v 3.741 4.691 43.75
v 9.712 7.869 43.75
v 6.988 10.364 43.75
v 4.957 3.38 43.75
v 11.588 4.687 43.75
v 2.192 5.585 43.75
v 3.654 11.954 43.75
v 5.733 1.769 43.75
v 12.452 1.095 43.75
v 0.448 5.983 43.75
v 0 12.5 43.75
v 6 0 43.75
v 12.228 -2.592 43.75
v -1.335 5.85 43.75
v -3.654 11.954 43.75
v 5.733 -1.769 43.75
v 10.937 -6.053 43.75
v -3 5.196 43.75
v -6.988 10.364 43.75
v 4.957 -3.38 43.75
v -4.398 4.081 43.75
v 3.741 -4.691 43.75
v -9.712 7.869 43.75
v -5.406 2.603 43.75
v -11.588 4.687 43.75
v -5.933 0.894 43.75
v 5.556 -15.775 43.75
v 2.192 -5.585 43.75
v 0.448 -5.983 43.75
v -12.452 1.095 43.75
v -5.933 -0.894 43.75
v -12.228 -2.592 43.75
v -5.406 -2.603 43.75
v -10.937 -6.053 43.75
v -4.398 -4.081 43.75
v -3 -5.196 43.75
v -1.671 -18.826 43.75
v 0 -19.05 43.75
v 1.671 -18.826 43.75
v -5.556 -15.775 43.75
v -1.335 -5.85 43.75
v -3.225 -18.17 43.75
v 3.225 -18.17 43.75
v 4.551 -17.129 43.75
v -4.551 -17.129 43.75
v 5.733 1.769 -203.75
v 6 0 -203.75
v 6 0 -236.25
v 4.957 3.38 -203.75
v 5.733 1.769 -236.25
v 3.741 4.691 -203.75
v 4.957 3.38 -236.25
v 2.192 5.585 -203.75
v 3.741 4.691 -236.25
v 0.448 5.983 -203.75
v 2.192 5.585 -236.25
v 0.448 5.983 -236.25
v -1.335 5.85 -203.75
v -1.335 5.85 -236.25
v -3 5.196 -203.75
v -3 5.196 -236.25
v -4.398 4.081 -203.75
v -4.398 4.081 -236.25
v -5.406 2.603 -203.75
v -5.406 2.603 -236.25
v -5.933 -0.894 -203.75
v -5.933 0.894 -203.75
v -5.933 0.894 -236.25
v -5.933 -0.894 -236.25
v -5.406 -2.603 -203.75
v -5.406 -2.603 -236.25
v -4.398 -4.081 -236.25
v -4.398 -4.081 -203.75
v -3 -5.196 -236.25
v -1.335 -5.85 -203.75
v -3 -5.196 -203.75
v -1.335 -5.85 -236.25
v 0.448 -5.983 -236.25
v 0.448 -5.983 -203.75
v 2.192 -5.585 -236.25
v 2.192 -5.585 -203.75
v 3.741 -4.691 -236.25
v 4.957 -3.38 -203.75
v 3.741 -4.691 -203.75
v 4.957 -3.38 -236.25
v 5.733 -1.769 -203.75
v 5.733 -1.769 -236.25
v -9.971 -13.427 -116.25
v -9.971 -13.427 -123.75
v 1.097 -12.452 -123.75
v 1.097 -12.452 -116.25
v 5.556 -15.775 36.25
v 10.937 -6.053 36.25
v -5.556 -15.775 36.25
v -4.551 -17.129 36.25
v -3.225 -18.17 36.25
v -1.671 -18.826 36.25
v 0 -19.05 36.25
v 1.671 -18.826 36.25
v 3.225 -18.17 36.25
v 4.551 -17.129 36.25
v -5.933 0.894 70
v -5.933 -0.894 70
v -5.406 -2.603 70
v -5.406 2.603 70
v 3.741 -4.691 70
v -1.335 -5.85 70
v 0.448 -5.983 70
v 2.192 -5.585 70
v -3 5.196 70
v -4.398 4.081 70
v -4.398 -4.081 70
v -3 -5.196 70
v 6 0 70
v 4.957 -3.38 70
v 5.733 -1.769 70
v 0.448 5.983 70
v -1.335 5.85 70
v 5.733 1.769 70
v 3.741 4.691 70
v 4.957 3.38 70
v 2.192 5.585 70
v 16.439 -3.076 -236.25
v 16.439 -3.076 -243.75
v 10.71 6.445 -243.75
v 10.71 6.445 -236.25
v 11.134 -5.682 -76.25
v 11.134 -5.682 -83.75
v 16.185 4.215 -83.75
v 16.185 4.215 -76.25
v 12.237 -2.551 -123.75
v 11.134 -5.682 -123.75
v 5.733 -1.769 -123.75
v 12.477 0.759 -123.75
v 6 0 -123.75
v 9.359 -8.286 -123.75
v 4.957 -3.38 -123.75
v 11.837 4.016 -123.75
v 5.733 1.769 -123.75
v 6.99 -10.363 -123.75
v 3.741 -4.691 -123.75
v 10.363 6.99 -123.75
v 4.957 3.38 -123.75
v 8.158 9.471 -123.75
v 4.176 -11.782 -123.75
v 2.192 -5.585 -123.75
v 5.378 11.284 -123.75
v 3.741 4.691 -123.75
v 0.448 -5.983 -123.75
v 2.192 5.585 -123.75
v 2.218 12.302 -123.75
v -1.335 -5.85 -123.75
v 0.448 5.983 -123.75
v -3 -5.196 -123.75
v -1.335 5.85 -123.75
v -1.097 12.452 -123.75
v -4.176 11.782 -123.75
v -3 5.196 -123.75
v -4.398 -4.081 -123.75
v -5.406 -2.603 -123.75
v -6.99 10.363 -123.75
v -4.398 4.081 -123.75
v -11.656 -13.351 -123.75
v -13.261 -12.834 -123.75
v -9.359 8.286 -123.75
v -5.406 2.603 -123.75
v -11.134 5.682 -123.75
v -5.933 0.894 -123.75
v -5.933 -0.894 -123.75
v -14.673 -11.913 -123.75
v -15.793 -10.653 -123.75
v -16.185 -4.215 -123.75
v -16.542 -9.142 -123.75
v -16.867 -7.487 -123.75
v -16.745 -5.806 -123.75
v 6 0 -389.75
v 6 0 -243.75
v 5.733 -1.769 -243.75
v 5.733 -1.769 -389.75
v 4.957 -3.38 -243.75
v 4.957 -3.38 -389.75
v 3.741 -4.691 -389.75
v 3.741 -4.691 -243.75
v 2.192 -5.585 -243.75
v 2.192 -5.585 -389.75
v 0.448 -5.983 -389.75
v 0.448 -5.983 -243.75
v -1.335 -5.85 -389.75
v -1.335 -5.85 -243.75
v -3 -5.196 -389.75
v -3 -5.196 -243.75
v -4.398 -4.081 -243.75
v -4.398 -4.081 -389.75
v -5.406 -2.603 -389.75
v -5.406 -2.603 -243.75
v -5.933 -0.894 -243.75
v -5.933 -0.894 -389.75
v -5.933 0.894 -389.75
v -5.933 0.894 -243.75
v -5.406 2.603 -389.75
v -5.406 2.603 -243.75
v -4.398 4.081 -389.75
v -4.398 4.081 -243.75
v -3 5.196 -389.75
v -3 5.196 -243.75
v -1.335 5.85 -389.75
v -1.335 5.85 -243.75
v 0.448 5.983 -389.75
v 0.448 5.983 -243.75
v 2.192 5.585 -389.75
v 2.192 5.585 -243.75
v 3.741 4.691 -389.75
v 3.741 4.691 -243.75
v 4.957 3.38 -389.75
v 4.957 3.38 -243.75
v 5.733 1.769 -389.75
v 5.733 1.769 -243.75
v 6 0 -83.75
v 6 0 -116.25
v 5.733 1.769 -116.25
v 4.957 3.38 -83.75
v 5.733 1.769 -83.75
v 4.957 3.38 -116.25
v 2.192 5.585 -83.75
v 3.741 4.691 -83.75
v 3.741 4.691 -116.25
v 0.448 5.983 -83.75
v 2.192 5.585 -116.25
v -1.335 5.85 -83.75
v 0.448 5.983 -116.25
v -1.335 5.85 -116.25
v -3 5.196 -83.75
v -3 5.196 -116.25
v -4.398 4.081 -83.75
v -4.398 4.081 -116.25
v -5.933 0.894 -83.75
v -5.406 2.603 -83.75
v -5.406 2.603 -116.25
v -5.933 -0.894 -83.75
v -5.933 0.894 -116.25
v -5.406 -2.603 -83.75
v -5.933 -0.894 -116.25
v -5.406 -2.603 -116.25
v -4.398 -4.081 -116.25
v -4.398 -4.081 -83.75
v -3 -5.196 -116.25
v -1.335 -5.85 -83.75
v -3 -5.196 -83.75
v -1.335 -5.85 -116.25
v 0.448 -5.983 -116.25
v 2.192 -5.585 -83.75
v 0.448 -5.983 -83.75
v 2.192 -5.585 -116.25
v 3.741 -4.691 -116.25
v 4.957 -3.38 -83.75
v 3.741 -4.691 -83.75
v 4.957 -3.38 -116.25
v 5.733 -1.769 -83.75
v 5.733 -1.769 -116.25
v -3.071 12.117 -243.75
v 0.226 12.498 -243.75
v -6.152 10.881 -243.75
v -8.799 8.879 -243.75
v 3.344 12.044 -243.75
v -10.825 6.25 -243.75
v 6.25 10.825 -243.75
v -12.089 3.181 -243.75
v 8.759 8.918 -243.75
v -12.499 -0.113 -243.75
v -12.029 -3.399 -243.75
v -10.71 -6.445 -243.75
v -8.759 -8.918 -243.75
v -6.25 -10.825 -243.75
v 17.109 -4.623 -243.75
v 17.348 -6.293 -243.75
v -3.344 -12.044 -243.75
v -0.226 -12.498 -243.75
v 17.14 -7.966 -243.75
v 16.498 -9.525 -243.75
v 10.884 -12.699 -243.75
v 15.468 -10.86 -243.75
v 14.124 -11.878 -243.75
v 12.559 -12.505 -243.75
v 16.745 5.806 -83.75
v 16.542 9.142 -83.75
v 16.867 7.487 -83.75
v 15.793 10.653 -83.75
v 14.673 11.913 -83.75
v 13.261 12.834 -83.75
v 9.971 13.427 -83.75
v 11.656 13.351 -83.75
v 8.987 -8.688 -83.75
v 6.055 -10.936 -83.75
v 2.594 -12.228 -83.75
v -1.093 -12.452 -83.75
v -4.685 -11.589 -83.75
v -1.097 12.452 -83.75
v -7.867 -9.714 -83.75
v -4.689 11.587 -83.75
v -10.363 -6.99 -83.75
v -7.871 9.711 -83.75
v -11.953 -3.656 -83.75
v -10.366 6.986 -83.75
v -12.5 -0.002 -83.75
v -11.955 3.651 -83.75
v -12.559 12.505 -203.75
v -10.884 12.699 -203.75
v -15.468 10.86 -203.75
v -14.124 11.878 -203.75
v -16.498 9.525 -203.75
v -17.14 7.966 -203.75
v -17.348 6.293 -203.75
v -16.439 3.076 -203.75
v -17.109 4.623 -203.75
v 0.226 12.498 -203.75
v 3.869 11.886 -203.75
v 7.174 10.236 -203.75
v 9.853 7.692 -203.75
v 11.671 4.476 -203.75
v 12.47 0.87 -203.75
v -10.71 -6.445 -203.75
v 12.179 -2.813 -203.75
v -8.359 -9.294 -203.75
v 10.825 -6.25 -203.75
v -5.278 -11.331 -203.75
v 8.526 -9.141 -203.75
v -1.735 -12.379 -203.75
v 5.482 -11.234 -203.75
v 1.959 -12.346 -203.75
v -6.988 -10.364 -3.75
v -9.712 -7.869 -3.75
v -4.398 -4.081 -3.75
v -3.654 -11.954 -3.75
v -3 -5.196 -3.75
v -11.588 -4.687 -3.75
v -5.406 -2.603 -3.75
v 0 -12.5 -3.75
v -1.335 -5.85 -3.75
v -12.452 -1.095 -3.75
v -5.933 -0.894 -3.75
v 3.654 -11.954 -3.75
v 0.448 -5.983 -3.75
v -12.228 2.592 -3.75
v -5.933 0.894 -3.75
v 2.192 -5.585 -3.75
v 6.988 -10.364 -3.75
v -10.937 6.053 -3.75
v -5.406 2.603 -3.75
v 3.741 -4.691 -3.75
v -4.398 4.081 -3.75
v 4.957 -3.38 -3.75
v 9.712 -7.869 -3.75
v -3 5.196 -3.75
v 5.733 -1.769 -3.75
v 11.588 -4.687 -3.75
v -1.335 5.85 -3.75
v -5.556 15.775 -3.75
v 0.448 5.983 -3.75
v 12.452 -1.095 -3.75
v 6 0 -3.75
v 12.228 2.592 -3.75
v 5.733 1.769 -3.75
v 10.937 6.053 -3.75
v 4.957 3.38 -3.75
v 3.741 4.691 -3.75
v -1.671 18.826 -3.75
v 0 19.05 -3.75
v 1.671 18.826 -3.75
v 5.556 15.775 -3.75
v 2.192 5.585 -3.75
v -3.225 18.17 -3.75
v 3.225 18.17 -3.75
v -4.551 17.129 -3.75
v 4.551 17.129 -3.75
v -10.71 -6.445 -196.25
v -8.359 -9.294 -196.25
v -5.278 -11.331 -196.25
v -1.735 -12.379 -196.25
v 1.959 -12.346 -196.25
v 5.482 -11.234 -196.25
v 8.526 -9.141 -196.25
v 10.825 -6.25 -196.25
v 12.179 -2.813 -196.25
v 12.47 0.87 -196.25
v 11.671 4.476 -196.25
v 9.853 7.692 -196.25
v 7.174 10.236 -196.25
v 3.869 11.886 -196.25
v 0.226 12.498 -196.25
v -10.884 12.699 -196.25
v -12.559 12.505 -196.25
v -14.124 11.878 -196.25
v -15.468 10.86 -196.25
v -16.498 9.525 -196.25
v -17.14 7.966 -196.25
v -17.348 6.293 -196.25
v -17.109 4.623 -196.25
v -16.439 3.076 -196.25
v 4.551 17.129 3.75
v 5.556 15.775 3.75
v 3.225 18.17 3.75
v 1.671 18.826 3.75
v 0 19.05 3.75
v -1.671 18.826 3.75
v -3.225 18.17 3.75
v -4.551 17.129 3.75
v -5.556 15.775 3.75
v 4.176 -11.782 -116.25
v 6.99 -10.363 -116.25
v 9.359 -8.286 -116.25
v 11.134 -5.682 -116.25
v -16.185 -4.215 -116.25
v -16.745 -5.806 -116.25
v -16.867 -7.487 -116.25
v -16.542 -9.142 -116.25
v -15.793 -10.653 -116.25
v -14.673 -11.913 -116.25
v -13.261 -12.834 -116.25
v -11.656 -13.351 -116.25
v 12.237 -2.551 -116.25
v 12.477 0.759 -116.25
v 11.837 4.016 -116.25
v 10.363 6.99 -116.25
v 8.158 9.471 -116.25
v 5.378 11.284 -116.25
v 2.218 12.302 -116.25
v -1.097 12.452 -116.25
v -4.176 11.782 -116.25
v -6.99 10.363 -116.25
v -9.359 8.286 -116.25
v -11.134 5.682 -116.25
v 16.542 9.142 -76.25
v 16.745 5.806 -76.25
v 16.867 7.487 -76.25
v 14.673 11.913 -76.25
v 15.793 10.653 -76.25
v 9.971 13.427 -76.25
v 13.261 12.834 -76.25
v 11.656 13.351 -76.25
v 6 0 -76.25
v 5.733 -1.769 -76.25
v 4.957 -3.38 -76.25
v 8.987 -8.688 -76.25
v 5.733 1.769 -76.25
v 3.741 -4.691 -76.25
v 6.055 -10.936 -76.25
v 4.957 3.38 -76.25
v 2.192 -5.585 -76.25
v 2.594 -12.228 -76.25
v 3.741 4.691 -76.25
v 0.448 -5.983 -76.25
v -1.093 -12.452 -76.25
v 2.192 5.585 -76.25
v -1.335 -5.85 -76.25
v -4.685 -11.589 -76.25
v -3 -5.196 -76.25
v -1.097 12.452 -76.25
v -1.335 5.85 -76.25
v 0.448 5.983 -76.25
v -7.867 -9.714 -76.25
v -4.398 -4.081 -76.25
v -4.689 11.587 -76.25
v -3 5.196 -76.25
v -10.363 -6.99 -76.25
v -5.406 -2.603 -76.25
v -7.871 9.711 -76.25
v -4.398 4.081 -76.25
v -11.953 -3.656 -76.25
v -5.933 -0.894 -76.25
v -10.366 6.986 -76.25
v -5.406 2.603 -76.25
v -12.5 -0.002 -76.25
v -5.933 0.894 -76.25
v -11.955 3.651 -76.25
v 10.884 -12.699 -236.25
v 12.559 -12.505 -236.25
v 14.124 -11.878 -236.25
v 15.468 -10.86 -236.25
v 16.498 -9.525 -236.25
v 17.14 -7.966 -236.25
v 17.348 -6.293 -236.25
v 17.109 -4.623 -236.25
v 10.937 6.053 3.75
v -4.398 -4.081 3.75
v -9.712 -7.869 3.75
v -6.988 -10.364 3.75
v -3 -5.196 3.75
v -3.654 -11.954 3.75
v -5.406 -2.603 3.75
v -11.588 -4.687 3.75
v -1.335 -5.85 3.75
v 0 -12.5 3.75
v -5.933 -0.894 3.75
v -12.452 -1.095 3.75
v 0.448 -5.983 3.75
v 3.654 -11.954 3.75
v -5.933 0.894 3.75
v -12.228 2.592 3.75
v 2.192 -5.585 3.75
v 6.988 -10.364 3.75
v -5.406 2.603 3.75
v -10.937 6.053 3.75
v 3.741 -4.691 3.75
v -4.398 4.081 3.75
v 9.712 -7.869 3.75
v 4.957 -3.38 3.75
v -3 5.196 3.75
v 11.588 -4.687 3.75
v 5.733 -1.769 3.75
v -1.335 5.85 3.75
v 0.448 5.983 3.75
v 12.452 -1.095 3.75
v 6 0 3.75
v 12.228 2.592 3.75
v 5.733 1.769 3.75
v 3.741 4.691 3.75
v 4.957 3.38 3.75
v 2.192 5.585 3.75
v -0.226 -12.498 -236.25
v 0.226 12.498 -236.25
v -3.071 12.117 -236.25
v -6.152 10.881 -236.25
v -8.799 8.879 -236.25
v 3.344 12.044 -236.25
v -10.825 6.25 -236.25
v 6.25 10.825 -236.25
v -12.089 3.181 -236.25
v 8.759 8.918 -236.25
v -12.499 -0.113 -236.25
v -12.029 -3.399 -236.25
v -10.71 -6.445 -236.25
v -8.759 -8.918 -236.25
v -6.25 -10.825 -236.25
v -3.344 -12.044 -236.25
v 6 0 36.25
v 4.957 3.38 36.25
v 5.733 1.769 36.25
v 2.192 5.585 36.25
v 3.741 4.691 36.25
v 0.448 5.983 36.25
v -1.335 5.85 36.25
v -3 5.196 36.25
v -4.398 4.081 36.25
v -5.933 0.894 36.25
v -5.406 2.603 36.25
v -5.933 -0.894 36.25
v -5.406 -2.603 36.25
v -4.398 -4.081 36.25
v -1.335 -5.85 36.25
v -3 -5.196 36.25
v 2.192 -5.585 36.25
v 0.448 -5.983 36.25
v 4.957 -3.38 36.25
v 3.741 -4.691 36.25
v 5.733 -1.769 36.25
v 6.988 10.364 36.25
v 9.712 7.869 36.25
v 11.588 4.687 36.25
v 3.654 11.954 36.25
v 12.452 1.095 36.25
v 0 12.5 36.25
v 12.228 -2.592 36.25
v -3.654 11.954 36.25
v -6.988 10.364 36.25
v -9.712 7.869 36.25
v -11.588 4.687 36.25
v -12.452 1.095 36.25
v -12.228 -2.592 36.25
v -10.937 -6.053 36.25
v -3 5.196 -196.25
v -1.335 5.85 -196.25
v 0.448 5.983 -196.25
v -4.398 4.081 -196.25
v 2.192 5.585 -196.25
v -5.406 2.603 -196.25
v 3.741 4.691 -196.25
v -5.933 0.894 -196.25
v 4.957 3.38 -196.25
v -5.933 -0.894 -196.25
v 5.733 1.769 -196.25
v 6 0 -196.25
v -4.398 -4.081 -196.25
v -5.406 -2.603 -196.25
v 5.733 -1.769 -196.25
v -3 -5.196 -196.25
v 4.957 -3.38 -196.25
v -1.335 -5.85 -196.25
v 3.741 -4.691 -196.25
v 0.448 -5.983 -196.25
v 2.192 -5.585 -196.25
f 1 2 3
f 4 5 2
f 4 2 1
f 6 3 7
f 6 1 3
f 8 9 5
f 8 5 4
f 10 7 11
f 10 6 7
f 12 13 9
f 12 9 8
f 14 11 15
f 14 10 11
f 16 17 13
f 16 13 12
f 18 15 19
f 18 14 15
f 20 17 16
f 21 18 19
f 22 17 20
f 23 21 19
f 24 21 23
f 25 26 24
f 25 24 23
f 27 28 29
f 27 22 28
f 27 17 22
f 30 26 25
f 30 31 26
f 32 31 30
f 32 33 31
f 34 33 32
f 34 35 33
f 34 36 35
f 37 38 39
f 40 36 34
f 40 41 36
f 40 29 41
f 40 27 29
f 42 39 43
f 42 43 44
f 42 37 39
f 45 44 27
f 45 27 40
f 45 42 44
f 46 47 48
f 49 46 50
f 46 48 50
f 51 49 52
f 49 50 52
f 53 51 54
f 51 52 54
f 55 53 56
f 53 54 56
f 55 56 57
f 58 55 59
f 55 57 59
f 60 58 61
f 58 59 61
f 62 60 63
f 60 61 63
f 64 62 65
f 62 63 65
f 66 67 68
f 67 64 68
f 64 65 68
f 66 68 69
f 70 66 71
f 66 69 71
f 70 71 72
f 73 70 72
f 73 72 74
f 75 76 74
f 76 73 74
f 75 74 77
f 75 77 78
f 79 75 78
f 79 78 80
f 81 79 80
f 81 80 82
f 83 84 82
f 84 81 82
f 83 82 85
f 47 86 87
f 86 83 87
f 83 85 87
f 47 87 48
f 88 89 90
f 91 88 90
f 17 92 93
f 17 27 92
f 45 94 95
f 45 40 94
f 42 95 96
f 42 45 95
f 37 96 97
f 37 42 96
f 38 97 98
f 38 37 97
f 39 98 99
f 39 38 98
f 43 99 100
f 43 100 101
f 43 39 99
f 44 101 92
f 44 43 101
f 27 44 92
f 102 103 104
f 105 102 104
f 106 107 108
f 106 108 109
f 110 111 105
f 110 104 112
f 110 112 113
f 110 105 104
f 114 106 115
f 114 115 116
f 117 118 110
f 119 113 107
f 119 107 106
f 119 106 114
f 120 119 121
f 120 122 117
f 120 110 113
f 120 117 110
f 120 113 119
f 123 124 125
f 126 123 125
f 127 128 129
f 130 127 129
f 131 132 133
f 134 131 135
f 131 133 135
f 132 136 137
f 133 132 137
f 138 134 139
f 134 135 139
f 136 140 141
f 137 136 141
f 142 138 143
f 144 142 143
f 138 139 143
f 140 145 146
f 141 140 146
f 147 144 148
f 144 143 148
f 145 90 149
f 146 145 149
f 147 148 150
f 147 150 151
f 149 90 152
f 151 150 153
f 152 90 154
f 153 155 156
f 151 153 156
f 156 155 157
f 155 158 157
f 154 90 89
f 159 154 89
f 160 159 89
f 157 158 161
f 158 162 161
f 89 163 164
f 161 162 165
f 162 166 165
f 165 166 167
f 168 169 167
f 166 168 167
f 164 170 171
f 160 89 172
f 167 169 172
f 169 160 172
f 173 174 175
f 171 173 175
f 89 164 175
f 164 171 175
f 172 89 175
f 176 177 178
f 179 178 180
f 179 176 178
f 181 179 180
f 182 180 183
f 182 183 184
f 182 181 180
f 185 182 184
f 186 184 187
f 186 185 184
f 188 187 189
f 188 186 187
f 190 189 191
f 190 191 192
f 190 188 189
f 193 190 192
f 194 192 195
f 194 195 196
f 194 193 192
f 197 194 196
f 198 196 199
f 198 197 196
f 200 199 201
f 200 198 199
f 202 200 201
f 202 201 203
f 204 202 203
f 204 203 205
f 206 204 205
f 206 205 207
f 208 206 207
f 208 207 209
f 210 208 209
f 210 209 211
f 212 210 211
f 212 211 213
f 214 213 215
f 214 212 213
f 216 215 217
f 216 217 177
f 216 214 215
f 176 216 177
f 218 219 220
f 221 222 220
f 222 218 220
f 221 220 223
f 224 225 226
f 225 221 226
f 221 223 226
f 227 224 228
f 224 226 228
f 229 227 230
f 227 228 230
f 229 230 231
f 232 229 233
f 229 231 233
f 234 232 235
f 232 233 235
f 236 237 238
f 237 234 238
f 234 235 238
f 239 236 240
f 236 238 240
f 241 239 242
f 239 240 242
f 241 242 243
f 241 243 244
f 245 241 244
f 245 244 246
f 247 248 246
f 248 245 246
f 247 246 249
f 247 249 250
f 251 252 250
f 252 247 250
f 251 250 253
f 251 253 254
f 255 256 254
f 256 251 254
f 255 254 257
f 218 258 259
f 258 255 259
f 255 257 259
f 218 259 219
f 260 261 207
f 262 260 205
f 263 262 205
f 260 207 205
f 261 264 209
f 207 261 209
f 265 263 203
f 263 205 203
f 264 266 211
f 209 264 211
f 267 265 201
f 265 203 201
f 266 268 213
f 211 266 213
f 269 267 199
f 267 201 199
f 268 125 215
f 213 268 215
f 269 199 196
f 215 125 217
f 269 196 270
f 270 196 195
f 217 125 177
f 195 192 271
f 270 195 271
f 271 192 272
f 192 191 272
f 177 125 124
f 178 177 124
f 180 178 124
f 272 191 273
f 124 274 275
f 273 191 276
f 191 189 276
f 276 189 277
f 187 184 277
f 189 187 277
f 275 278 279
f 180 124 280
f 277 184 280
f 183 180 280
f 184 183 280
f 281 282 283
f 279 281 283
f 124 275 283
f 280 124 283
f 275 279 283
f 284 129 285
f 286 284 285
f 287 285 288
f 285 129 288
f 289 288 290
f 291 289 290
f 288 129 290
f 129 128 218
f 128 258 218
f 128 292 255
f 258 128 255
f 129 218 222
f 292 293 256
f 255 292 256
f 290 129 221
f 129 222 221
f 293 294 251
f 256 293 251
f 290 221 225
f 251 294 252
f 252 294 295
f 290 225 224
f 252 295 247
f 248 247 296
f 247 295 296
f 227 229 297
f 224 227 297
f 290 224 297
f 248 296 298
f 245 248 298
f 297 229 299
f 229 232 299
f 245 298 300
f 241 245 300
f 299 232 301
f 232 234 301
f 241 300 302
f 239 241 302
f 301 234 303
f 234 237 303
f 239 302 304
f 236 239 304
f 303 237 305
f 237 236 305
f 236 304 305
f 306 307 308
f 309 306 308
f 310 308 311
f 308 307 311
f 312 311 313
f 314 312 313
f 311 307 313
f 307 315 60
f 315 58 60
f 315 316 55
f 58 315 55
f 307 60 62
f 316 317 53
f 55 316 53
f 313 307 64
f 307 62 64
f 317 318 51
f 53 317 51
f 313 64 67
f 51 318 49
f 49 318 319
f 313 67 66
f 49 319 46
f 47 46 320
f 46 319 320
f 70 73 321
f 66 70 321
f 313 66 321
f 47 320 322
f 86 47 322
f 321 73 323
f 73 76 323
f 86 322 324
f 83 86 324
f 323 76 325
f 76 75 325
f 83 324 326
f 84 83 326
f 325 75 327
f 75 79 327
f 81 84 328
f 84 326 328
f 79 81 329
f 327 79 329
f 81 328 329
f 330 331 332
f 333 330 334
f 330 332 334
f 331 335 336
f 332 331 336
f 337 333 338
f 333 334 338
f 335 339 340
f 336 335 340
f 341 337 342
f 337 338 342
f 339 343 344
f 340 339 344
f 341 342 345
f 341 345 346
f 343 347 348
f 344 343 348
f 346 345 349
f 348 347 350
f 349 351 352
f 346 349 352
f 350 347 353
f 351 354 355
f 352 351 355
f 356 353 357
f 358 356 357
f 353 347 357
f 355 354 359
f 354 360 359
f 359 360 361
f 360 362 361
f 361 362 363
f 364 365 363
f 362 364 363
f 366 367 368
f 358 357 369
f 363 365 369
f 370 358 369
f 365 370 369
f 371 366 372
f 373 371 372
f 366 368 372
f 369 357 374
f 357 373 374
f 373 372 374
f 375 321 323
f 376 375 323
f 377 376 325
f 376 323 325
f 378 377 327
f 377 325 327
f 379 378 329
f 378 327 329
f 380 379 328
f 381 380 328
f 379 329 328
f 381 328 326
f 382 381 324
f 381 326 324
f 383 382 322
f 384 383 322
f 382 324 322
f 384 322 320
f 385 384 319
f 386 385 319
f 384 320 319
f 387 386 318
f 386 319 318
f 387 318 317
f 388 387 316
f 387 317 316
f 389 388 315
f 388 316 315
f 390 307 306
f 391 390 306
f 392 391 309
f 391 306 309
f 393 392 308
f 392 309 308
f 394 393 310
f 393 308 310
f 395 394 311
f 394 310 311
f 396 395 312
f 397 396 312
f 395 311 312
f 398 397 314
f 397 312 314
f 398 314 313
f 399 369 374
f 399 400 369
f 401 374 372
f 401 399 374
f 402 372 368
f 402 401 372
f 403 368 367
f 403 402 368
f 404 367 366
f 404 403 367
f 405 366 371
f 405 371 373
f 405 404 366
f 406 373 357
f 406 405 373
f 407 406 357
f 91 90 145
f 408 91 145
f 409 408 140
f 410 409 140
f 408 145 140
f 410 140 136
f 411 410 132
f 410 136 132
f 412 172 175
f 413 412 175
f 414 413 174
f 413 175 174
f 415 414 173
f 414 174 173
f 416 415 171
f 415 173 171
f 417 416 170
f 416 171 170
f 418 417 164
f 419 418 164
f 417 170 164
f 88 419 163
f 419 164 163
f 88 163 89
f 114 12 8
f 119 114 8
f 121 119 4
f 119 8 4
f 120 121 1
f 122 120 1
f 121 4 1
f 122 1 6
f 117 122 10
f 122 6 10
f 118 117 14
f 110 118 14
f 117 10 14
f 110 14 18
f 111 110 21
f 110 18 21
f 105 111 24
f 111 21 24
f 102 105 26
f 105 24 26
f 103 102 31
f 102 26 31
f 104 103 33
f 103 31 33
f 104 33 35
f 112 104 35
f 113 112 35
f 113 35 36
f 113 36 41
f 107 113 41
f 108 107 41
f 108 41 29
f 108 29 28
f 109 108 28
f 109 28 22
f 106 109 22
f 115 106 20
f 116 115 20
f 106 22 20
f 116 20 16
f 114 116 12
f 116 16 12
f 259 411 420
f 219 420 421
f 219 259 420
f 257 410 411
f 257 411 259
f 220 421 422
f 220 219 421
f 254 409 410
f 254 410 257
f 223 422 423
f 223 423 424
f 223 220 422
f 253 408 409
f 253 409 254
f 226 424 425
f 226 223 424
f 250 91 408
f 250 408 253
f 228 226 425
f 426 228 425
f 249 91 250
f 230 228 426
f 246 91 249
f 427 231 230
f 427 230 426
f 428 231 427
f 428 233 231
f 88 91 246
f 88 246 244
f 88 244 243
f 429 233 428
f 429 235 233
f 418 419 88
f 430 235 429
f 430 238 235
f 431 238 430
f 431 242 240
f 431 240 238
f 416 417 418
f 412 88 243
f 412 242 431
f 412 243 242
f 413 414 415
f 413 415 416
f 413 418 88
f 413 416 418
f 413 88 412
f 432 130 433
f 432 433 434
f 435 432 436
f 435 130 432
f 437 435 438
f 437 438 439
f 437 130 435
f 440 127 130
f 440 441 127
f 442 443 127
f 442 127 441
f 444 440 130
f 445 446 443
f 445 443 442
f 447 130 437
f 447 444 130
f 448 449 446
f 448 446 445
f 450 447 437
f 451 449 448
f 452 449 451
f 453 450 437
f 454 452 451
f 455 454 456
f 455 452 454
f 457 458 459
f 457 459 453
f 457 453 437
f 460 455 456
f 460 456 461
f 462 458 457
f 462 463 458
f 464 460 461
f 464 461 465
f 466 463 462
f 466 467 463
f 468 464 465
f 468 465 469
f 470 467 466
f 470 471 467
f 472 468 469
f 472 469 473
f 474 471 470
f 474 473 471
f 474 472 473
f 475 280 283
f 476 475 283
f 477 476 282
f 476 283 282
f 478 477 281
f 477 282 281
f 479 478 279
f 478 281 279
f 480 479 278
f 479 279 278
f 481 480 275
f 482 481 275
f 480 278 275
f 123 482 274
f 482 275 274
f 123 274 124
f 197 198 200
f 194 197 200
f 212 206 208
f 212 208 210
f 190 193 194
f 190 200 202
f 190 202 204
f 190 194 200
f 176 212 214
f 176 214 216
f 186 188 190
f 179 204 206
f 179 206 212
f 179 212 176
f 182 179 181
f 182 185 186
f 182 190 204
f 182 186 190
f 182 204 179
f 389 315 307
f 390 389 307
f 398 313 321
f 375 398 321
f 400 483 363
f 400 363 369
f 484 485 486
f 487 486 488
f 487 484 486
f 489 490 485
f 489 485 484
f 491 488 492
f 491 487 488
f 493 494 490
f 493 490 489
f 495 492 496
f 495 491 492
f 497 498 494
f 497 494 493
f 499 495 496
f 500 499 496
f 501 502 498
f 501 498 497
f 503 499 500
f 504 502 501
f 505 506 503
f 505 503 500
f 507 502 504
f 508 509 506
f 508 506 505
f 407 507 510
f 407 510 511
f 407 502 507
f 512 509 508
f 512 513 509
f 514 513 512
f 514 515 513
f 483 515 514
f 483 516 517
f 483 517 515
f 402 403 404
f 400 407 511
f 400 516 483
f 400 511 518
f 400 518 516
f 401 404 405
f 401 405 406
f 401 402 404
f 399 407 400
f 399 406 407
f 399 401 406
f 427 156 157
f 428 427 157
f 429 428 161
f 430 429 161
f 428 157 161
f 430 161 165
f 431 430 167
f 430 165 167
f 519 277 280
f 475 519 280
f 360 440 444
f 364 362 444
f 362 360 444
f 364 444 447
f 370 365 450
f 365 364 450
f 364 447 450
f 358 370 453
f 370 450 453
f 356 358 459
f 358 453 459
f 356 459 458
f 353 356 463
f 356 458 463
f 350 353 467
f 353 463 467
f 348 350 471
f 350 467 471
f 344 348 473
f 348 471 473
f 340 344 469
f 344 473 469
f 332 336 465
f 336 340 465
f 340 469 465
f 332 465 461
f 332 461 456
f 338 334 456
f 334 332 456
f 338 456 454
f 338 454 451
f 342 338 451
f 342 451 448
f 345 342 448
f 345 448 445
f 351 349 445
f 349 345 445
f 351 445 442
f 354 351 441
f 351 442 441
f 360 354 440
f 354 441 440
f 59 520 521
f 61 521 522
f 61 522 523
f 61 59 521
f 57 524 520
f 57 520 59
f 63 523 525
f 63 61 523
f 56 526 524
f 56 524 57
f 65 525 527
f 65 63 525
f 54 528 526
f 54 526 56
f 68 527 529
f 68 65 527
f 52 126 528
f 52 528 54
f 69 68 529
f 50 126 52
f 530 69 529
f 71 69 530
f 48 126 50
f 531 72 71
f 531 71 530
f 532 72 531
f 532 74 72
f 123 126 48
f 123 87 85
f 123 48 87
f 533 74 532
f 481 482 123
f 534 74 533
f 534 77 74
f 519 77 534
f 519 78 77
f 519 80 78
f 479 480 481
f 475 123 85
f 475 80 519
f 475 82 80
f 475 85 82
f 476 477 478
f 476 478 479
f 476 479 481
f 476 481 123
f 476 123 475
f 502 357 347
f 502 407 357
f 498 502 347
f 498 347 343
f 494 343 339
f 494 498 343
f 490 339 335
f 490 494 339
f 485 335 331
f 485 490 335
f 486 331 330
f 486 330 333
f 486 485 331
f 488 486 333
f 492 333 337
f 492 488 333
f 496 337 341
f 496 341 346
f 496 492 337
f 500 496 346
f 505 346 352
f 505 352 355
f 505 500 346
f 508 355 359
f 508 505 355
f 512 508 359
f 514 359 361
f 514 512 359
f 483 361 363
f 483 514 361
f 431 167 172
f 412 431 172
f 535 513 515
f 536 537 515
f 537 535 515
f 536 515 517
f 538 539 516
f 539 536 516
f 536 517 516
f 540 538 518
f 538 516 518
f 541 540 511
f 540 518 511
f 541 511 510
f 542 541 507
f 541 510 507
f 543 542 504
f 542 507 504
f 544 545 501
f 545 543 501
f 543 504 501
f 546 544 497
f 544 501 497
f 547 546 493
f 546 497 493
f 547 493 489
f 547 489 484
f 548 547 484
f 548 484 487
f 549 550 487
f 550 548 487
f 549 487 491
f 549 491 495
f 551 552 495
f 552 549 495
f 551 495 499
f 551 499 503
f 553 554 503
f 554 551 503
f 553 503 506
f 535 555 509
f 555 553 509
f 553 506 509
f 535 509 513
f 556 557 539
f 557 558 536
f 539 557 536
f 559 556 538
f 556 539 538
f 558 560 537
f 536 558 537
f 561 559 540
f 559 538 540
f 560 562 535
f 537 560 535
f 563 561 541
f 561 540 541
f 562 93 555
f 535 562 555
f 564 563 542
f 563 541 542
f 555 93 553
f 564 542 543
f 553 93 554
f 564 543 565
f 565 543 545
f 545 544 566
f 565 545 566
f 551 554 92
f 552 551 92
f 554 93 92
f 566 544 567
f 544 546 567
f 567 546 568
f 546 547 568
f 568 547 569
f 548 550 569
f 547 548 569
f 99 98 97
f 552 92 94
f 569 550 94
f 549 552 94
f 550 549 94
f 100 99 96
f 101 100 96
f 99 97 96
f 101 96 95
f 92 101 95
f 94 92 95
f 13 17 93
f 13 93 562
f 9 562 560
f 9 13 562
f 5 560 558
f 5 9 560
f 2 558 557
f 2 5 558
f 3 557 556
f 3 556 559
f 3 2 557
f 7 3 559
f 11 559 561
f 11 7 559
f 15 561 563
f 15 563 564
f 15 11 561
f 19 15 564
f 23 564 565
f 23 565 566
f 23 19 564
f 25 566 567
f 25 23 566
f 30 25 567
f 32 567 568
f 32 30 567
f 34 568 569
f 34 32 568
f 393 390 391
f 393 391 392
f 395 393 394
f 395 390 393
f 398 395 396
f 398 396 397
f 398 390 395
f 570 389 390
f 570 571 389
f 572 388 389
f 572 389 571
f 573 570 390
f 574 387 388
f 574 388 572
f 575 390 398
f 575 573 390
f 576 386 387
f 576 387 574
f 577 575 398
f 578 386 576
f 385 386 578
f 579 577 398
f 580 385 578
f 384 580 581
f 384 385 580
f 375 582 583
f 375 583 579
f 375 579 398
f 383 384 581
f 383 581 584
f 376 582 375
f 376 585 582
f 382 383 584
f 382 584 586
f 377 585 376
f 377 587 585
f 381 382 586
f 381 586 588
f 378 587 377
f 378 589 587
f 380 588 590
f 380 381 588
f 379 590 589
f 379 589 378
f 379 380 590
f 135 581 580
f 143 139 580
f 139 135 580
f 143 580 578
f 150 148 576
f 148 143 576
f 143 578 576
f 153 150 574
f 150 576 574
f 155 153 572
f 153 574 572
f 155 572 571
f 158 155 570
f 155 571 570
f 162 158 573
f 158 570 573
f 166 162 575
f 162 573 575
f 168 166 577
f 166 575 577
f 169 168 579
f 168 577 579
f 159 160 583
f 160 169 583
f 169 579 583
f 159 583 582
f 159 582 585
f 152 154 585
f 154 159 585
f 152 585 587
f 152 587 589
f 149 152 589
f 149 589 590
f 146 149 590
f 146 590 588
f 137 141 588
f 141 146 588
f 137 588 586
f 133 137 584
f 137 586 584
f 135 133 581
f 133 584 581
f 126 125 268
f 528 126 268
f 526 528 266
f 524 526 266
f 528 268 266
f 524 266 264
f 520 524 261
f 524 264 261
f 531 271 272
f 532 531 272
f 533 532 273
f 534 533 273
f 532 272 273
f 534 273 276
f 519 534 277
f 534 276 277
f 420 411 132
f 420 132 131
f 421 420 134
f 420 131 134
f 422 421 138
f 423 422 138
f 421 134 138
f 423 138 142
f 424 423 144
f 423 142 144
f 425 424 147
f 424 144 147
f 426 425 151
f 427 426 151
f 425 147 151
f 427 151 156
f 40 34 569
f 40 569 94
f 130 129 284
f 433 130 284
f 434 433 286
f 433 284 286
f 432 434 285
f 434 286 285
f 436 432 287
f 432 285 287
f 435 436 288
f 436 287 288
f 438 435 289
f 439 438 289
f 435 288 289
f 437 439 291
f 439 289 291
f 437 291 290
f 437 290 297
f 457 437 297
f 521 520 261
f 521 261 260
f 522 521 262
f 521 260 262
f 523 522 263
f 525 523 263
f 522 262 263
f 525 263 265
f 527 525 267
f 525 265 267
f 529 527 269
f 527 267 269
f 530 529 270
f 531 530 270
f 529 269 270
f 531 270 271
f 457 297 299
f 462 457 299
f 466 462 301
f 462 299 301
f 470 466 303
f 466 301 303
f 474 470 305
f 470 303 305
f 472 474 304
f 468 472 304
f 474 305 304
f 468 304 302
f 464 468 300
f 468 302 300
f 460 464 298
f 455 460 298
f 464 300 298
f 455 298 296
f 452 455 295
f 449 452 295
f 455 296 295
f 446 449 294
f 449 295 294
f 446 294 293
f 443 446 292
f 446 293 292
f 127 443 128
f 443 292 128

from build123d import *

# Parameters (mm, degrees)
SALIENTE_EXTRUIR1_DEPTH      = 3.75
S_LIDO_MOVER_COPIAR2_ANGLE   = 180
S_LIDO_MOVER_COPIAR4_START   = -243.75
S_LIDO_MOVER_COPIAR4_DEPTH   = 7.5
S_LIDO_MOVER_COPIAR4_START_2 = -203.75
S_LIDO_MOVER_COPIAR4_2_DEPTH = 7.5
S_LIDO_MOVER_COPIAR4_START_3 = -123.75
S_LIDO_MOVER_COPIAR4_3_DEPTH = 7.5
S_LIDO_MOVER_COPIAR4_START_4 = -83.75
S_LIDO_MOVER_COPIAR4_4_DEPTH = 7.5
S_LIDO_MOVER_COPIAR5_ANGLE   = 124
S_LIDO_MOVER_COPIAR6_ANGLE   = 120
CROQUIS5_R                   = 6
SALIENTE_EXTRUIR4_DEPTH      = 275
SALIENTE_EXTRUIR5_START      = 146
CROQUIS6_R                   = 6
SALIENTE_EXTRUIR5_DEPTH      = 146
CROQUIS7_R                   = 6
SALIENTE_EXTRUIR6_DEPTH      = 26.25


# Read off the part's stored shape, not the designer's step: Sólido-Mover/Copiar4
with BuildPart() as part:
    # Croquis1 → Saliente-Extruir1 (new, symmetric)
    with BuildSketch(Plane.XY):
        with BuildLine():
            Line((-5.555796523, 15.775), (-10.936607328, 6.053149606))
            ThreePointArc((-10.936607328, 6.053149606), (0, -12.5), (10.936607328, 6.053149606))
            Line((10.936607328, 6.053149606), (5.555796523, 15.775))
            ThreePointArc((5.555796523, 15.775), (0, 19.05), (-5.555796523, 15.775))
        make_face()
    extrude(amount=SALIENTE_EXTRUIR1_DEPTH, both=True)


with BuildPart() as body_2:
    # Sólido-Mover/Copiar1: copy of part
    add(part.part.moved(Location((0, 0, 40))))


with BuildPart() as body_2_1:
    # Sólido-Mover/Copiar2: moved
    add(body_2.part.rotate(Axis((0, 0, 0), (0, 0, 1)), S_LIDO_MOVER_COPIAR2_ANGLE))


with BuildPart() as body_3:
    # Sólido-Mover/Copiar4 outline → Sólido-Mover/Copiar4 (new body)
    with BuildSketch(Plane.XY.offset(S_LIDO_MOVER_COPIAR4_START)):
        with BuildLine():
            ThreePointArc((5.555796523, 15.775), (0, 19.05), (-5.555796523, 15.775))
            Line((-5.555796523, 15.775), (-10.936607328, 6.053149606))
            ThreePointArc((-10.936607328, 6.053149606), (-12.5, 0), (-10.936607328, -6.053149606))
            ThreePointArc((-10.936607328, -6.053149606), (0, -12.5), (10.936607328, -6.053149606))
            ThreePointArc((10.936607328, -6.053149606), (12.5, 0), (10.936607328, 6.053149606))
            Line((10.936607328, 6.053149606), (5.555796523, 15.775))
        make_face()
    extrude(amount=S_LIDO_MOVER_COPIAR4_DEPTH)


with BuildPart() as body_4:
    # S_lido-Mover_Copiar4 2 outline → S_lido-Mover_Copiar4 2 (new body)
    with BuildSketch(Plane.XY.offset(S_LIDO_MOVER_COPIAR4_START_2)):
        with BuildLine():
            Line((-10.936607328, -6.053149606), (-5.555796523, -15.775))
            ThreePointArc((-5.555796523, -15.775), (0, -19.05), (5.555796523, -15.775))
            Line((5.555796523, -15.775), (10.936607328, -6.053149606))
            ThreePointArc((10.936607328, -6.053149606), (0, 12.5), (-10.936607328, -6.053149606))
        make_face()
    extrude(amount=S_LIDO_MOVER_COPIAR4_2_DEPTH)


with BuildPart() as body_5:
    # S_lido-Mover_Copiar4 3 outline → S_lido-Mover_Copiar4 3 (new body)
    with BuildSketch(Plane.XY.offset(S_LIDO_MOVER_COPIAR4_START_3)):
        with BuildLine():
            ThreePointArc((5.555796523, 15.775), (0, 19.05), (-5.555796523, 15.775))
            Line((-5.555796523, 15.775), (-10.936607328, 6.053149606))
            ThreePointArc((-10.936607328, 6.053149606), (-12.5, 0), (-10.936607328, -6.053149606))
            ThreePointArc((-10.936607328, -6.053149606), (0, -12.5), (10.936607328, -6.053149606))
            ThreePointArc((10.936607328, -6.053149606), (12.5, 0), (10.936607328, 6.053149606))
            Line((10.936607328, 6.053149606), (5.555796523, 15.775))
        make_face()
    extrude(amount=S_LIDO_MOVER_COPIAR4_3_DEPTH)


with BuildPart() as body_6:
    # S_lido-Mover_Copiar4 4 outline → S_lido-Mover_Copiar4 4 (new body)
    with BuildSketch(Plane.XY.offset(S_LIDO_MOVER_COPIAR4_START_4)):
        with BuildLine():
            Line((-10.936607328, -6.053149606), (-5.555796523, -15.775))
            ThreePointArc((-5.555796523, -15.775), (0, -19.05), (5.555796523, -15.775))
            Line((5.555796523, -15.775), (10.936607328, -6.053149606))
            ThreePointArc((10.936607328, -6.053149606), (0, 12.5), (-10.936607328, -6.053149606))
        make_face()
    extrude(amount=S_LIDO_MOVER_COPIAR4_4_DEPTH)


with BuildPart() as body_6_1:
    # Sólido-Mover/Copiar5: moved
    add(body_6.part.rotate(Axis((0, 0, 0), (0, 0, 1)), S_LIDO_MOVER_COPIAR5_ANGLE))


with BuildPart() as body_5_1:
    # Sólido-Mover/Copiar5: moved
    add(body_5.part.rotate(Axis((0, 0, 0), (0, 0, 1)), S_LIDO_MOVER_COPIAR5_ANGLE))


with BuildPart() as body_3_1:
    # Sólido-Mover/Copiar6: moved
    add(body_3.part.rotate(Axis((0, 0, 0), (0, 0, -1)), S_LIDO_MOVER_COPIAR6_ANGLE))


with BuildPart() as body_4_1:
    # Sólido-Mover/Copiar6: moved
    add(body_4.part.rotate(Axis((0, 0, 0), (0, 0, -1)), S_LIDO_MOVER_COPIAR6_ANGLE))


with BuildPart() as part_1:
    add(part.part)

    add(body_2_1.part)  # Saliente-Extruir4 merges body 2

    add(body_3_1.part)  # Saliente-Extruir4 merges body 3

    add(body_4_1.part)  # Saliente-Extruir4 merges body 4

    add(body_5_1.part)  # Saliente-Extruir4 merges body 5

    add(body_6_1.part)  # Saliente-Extruir4 merges body 6
    # Croquis5 → Saliente-Extruir4 (add)
    with BuildSketch(Plane.XY.offset(-236.25)):
        Circle(CROQUIS5_R)
    extrude(amount=SALIENTE_EXTRUIR4_DEPTH)

    # Croquis6 → Saliente-Extruir5 (add)
    with BuildSketch(Plane(origin=(0, 0, -243.75), x_dir=(-1, 0, 0), z_dir=(0, 0, -1)).offset(SALIENTE_EXTRUIR5_START)):
        with Locations(Location((0, 0, 0), (0, 0, 180))):
            Circle(CROQUIS6_R)
    extrude(amount=-SALIENTE_EXTRUIR5_DEPTH)

    # Croquis7 → Saliente-Extruir6 (add)
    with BuildSketch(Plane.XY.offset(43.75)):
        Circle(CROQUIS7_R)
    extrude(amount=SALIENTE_EXTRUIR6_DEPTH)


solid = part_1.part
